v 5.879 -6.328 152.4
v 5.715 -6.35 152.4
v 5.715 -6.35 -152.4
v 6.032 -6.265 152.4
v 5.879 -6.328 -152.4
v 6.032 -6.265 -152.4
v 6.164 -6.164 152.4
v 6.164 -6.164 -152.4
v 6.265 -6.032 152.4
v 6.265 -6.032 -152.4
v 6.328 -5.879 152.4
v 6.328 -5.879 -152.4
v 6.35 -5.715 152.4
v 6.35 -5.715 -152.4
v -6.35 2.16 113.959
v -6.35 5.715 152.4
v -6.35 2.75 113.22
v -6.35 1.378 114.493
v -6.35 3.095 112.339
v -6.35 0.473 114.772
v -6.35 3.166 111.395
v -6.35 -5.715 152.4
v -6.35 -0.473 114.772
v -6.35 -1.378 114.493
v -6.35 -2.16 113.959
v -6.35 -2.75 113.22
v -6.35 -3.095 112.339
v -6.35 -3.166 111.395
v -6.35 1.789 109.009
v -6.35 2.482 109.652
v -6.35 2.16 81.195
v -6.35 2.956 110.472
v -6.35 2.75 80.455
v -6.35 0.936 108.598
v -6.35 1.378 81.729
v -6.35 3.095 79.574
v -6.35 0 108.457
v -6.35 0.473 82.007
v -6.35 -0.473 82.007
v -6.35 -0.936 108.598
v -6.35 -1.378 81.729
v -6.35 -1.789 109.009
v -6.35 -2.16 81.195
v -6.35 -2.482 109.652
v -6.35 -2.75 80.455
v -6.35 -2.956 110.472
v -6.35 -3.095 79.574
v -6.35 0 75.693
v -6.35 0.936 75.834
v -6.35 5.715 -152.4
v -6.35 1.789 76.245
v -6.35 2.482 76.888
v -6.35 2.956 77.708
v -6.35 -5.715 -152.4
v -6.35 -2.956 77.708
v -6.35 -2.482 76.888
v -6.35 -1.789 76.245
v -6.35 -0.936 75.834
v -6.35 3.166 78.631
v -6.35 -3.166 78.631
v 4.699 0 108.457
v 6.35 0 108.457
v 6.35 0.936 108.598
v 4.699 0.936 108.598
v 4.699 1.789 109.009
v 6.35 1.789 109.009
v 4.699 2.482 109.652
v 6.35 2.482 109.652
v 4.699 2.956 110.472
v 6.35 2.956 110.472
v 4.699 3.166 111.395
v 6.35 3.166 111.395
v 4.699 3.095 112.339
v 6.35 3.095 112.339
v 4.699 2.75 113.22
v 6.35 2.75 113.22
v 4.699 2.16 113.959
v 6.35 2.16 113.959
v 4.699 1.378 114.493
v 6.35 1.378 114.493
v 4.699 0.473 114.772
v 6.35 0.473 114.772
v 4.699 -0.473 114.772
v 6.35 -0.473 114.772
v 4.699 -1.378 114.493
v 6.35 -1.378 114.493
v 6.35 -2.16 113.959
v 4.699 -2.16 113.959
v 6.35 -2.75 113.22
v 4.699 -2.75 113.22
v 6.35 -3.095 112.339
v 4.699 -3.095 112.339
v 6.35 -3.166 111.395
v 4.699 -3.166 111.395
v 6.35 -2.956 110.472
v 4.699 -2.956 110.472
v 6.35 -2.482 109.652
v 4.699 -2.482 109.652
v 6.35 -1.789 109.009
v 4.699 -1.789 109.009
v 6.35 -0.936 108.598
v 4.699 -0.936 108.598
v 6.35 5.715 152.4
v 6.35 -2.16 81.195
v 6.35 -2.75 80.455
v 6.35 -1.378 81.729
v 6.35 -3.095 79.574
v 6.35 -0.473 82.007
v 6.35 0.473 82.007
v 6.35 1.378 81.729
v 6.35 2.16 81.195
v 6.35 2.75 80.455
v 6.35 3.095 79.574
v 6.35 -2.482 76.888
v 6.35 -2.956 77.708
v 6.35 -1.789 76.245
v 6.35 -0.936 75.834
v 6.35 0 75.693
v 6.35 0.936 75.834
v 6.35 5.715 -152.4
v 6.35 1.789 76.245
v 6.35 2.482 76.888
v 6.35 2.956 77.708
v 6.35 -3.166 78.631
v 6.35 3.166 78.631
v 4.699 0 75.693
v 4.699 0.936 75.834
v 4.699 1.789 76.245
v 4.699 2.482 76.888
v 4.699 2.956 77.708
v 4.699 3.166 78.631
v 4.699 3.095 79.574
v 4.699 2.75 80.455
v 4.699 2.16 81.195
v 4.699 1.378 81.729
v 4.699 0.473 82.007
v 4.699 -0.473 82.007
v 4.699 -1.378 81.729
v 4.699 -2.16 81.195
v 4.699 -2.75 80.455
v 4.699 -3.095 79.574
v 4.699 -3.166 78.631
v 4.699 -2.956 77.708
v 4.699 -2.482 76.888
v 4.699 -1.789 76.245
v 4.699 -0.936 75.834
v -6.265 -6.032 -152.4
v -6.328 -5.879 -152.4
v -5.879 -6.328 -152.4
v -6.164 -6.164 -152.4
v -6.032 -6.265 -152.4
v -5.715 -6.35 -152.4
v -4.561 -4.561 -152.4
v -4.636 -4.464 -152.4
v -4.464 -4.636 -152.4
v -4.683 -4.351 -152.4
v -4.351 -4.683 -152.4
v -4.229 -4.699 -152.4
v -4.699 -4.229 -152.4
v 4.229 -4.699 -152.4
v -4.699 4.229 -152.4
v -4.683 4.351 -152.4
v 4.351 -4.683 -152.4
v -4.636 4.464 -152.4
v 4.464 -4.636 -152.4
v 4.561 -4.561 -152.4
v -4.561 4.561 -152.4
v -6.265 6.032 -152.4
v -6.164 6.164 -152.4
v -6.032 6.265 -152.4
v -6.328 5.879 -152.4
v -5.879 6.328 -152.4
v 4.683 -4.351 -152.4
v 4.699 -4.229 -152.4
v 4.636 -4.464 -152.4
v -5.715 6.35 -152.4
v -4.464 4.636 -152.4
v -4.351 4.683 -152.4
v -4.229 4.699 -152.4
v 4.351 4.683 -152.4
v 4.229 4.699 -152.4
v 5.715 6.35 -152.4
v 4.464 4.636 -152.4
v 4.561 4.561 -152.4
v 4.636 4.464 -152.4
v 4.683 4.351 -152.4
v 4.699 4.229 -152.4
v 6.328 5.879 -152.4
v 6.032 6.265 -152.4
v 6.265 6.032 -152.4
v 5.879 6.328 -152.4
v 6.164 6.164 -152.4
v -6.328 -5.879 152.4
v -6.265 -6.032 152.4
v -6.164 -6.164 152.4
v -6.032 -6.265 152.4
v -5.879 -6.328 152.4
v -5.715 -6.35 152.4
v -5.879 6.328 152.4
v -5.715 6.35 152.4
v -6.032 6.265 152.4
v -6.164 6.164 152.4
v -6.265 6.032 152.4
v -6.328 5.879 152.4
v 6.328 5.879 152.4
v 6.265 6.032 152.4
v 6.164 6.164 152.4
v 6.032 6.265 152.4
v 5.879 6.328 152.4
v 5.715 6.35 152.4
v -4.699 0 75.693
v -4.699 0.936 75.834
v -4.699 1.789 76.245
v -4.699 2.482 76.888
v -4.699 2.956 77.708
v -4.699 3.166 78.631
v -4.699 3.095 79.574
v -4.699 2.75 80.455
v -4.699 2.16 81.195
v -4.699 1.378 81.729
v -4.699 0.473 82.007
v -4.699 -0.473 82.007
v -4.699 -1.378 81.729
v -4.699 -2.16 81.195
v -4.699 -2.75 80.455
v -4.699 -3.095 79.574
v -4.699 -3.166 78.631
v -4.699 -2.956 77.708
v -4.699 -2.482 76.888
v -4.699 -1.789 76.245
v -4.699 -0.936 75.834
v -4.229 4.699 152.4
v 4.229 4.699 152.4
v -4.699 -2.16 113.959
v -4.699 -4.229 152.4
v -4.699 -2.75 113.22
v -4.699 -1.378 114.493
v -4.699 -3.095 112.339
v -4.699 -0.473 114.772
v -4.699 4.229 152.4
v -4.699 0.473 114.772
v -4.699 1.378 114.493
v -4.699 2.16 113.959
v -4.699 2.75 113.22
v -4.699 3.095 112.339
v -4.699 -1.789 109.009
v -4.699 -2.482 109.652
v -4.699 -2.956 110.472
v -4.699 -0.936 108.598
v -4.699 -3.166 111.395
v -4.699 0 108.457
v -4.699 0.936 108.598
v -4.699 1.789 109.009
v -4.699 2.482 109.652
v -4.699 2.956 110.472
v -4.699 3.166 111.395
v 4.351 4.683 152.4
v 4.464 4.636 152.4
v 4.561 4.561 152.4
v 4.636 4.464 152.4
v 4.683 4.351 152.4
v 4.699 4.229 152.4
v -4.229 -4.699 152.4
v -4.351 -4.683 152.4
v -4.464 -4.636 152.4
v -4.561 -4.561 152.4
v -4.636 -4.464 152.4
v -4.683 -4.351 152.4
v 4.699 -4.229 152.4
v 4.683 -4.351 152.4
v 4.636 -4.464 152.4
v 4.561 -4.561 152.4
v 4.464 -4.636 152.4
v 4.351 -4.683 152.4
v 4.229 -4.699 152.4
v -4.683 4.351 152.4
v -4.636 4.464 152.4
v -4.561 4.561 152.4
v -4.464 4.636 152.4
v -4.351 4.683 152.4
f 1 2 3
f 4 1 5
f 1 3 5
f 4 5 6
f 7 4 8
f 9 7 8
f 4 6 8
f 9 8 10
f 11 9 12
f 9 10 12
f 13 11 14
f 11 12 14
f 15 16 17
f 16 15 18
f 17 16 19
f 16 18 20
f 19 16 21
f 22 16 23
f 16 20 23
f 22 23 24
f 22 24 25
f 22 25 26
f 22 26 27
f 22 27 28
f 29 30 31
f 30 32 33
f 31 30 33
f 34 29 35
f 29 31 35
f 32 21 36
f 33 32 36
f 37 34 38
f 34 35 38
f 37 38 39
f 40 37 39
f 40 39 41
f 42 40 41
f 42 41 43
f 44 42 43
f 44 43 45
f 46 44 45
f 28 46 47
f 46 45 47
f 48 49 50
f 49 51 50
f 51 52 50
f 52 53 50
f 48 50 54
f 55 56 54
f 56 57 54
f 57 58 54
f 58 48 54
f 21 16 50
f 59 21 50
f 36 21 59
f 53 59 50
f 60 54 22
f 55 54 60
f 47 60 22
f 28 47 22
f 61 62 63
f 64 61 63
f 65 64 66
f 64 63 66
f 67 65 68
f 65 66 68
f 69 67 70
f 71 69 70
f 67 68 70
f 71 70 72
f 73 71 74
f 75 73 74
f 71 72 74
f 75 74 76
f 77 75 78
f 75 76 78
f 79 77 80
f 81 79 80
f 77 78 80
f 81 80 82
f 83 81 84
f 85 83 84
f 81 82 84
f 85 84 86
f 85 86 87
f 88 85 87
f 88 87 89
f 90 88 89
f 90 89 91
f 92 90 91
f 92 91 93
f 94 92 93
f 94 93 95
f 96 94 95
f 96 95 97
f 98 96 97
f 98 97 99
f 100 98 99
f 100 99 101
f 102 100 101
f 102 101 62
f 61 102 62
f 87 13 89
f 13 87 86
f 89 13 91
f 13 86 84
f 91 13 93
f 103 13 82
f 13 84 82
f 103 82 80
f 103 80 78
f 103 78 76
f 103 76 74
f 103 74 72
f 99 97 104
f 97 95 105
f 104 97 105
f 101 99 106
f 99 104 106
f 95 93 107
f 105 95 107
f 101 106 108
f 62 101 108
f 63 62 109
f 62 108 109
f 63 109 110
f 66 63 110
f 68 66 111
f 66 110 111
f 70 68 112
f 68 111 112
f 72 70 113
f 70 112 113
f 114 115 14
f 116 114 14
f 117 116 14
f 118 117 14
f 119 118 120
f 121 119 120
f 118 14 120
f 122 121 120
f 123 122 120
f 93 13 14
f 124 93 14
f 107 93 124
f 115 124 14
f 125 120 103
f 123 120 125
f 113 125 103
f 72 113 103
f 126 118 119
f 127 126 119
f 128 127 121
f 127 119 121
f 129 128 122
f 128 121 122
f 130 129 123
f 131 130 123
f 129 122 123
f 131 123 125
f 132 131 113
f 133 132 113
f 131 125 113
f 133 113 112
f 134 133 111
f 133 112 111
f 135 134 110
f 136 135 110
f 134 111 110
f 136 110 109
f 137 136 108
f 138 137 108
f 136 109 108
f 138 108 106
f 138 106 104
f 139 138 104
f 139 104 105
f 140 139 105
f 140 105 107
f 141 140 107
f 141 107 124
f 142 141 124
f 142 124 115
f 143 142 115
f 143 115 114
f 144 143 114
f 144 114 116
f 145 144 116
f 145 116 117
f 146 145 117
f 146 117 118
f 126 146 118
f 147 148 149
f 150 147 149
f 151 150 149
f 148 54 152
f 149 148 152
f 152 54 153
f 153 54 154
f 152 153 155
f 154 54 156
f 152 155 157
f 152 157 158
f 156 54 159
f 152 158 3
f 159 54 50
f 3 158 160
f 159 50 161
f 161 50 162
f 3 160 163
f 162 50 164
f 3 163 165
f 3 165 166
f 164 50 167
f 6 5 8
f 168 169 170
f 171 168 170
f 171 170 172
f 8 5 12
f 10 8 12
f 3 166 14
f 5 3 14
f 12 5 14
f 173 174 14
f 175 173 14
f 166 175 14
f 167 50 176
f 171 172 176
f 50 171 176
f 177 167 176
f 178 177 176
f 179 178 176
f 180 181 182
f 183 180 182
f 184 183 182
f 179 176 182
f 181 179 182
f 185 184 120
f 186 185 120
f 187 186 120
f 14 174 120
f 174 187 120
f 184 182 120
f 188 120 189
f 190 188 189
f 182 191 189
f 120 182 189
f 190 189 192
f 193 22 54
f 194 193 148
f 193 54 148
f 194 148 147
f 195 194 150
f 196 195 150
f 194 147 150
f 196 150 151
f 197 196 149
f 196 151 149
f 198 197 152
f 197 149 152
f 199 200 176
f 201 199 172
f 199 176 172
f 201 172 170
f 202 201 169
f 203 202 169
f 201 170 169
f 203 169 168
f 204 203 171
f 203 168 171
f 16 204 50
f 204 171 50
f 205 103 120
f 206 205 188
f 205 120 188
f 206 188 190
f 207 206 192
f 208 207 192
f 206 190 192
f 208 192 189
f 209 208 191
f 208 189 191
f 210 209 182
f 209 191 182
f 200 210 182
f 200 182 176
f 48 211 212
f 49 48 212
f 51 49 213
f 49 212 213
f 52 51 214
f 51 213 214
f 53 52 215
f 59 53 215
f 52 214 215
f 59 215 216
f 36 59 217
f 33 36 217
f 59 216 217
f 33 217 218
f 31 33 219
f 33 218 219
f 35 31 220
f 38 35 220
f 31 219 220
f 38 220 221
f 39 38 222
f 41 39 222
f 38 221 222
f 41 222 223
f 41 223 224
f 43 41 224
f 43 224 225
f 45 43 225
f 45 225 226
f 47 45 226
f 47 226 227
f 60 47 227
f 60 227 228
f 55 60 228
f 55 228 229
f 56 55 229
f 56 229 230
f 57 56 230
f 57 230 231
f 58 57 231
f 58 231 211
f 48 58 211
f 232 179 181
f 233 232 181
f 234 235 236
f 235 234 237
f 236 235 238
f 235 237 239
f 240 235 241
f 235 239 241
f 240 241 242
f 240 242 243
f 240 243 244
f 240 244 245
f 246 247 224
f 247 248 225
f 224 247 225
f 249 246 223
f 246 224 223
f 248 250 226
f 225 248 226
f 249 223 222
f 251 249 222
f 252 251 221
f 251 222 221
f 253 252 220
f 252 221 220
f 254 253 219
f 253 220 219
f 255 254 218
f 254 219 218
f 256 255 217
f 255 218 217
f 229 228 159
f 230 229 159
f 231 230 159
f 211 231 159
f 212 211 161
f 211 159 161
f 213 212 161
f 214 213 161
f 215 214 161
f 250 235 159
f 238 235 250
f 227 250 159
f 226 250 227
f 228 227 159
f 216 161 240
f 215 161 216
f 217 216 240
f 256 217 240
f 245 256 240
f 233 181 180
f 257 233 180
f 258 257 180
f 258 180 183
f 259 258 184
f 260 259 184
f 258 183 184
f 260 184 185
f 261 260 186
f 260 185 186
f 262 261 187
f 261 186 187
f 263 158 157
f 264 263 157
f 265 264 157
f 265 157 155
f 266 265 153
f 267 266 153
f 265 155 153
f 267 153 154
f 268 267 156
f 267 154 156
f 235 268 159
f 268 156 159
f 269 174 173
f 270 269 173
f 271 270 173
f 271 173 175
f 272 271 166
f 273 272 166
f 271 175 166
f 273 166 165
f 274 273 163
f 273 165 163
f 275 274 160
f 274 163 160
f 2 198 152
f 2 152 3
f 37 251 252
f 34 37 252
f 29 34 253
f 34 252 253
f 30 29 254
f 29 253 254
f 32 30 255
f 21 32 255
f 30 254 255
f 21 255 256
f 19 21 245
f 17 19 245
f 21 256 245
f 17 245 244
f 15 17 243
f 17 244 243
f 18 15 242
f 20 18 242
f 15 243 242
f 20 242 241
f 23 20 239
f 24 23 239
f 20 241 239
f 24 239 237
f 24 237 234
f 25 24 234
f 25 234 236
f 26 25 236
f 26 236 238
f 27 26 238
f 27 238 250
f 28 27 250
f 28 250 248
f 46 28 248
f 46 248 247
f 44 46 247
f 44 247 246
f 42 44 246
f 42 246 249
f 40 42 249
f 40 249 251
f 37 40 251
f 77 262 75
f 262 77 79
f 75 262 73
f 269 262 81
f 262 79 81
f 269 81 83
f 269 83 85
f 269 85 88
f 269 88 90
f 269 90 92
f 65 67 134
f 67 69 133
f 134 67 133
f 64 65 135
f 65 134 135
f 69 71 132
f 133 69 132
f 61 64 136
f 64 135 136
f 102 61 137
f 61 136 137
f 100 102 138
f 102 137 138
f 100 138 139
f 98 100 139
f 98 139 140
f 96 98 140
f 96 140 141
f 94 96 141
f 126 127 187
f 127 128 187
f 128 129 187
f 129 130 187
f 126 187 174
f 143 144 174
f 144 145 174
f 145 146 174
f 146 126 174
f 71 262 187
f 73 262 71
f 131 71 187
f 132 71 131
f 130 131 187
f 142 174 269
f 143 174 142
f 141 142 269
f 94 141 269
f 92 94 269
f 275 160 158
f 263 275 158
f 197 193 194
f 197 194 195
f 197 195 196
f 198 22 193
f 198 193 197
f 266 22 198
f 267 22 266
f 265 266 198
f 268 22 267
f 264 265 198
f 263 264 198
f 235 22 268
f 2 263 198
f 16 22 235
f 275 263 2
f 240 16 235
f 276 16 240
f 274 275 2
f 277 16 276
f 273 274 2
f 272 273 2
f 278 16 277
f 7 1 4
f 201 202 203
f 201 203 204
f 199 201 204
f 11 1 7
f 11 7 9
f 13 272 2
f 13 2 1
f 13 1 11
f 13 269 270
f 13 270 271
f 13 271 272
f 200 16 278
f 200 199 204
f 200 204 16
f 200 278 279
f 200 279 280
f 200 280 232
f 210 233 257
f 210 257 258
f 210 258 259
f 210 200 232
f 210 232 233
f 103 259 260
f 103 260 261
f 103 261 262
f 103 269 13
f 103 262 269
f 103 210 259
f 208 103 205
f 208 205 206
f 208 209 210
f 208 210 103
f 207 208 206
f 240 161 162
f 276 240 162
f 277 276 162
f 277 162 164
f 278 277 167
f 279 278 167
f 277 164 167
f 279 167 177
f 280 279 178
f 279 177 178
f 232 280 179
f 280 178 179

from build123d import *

# Parameters (mm, degrees)
BOSS_EXTRUDE1_DEPTH         = 152.4
BOSS_EXTRUDE1_DEPTH_BACK    = 152.4
F_1_4_0_25_DIAMETER_HOLE1_D = 6.35


with BuildPart() as part:
    # Sketch4 → Boss-Extrude1 (new, two sides: drawn at the far end of the back side and taken through both)
    with BuildSketch(Plane.XY.offset(-BOSS_EXTRUDE1_DEPTH_BACK)):
        with BuildLine():
            Line((6.35, -5.715), (6.35, 5.715))
            ThreePointArc((6.35, 5.715), (6.164012806, 6.164012806), (5.715, 6.35))
            Line((5.715, 6.35), (-5.715, 6.35))
            ThreePointArc((-5.715, 6.35), (-6.164012806, 6.164012806), (-6.35, 5.715))
            Line((-6.35, 5.715), (-6.35, -5.715))
            ThreePointArc((-6.35, -5.715), (-6.164012806, -6.164012806), (-5.715, -6.35))
            Line((-5.715, -6.35), (5.715, -6.35))
            ThreePointArc((5.715, -6.35), (6.164012806, -6.164012806), (6.35, -5.715))
        make_face()
        with BuildLine():
            Line((4.699, 4.2291), (4.699, -4.2291))
            ThreePointArc((4.699, -4.2291), (4.561369476, -4.561369476), (4.2291, -4.699))
            Line((4.2291, -4.699), (-4.2291, -4.699))
            ThreePointArc((-4.2291, -4.699), (-4.561369476, -4.561369476), (-4.699, -4.2291))
            Line((-4.699, -4.2291), (-4.699, 4.2291))
            ThreePointArc((-4.699, 4.2291), (-4.561369476, 4.561369476), (-4.2291, 4.699))
            Line((-4.2291, 4.699), (4.2291, 4.699))
            ThreePointArc((4.2291, 4.699), (4.561369476, 4.561369476), (4.699, 4.2291))
        make_face(mode=Mode.SUBTRACT)
    extrude(amount=BOSS_EXTRUDE1_DEPTH + BOSS_EXTRUDE1_DEPTH_BACK)

    # 1/4 (0.25) Diameter Hole1 (through all)
    with Locations(Plane.ZY.offset(6.35)):
        with Locations((78.867958923, 0), (111.632041077, 0)):
            Hole(F_1_4_0_25_DIAMETER_HOLE1_D / 2)


solid = part.part
